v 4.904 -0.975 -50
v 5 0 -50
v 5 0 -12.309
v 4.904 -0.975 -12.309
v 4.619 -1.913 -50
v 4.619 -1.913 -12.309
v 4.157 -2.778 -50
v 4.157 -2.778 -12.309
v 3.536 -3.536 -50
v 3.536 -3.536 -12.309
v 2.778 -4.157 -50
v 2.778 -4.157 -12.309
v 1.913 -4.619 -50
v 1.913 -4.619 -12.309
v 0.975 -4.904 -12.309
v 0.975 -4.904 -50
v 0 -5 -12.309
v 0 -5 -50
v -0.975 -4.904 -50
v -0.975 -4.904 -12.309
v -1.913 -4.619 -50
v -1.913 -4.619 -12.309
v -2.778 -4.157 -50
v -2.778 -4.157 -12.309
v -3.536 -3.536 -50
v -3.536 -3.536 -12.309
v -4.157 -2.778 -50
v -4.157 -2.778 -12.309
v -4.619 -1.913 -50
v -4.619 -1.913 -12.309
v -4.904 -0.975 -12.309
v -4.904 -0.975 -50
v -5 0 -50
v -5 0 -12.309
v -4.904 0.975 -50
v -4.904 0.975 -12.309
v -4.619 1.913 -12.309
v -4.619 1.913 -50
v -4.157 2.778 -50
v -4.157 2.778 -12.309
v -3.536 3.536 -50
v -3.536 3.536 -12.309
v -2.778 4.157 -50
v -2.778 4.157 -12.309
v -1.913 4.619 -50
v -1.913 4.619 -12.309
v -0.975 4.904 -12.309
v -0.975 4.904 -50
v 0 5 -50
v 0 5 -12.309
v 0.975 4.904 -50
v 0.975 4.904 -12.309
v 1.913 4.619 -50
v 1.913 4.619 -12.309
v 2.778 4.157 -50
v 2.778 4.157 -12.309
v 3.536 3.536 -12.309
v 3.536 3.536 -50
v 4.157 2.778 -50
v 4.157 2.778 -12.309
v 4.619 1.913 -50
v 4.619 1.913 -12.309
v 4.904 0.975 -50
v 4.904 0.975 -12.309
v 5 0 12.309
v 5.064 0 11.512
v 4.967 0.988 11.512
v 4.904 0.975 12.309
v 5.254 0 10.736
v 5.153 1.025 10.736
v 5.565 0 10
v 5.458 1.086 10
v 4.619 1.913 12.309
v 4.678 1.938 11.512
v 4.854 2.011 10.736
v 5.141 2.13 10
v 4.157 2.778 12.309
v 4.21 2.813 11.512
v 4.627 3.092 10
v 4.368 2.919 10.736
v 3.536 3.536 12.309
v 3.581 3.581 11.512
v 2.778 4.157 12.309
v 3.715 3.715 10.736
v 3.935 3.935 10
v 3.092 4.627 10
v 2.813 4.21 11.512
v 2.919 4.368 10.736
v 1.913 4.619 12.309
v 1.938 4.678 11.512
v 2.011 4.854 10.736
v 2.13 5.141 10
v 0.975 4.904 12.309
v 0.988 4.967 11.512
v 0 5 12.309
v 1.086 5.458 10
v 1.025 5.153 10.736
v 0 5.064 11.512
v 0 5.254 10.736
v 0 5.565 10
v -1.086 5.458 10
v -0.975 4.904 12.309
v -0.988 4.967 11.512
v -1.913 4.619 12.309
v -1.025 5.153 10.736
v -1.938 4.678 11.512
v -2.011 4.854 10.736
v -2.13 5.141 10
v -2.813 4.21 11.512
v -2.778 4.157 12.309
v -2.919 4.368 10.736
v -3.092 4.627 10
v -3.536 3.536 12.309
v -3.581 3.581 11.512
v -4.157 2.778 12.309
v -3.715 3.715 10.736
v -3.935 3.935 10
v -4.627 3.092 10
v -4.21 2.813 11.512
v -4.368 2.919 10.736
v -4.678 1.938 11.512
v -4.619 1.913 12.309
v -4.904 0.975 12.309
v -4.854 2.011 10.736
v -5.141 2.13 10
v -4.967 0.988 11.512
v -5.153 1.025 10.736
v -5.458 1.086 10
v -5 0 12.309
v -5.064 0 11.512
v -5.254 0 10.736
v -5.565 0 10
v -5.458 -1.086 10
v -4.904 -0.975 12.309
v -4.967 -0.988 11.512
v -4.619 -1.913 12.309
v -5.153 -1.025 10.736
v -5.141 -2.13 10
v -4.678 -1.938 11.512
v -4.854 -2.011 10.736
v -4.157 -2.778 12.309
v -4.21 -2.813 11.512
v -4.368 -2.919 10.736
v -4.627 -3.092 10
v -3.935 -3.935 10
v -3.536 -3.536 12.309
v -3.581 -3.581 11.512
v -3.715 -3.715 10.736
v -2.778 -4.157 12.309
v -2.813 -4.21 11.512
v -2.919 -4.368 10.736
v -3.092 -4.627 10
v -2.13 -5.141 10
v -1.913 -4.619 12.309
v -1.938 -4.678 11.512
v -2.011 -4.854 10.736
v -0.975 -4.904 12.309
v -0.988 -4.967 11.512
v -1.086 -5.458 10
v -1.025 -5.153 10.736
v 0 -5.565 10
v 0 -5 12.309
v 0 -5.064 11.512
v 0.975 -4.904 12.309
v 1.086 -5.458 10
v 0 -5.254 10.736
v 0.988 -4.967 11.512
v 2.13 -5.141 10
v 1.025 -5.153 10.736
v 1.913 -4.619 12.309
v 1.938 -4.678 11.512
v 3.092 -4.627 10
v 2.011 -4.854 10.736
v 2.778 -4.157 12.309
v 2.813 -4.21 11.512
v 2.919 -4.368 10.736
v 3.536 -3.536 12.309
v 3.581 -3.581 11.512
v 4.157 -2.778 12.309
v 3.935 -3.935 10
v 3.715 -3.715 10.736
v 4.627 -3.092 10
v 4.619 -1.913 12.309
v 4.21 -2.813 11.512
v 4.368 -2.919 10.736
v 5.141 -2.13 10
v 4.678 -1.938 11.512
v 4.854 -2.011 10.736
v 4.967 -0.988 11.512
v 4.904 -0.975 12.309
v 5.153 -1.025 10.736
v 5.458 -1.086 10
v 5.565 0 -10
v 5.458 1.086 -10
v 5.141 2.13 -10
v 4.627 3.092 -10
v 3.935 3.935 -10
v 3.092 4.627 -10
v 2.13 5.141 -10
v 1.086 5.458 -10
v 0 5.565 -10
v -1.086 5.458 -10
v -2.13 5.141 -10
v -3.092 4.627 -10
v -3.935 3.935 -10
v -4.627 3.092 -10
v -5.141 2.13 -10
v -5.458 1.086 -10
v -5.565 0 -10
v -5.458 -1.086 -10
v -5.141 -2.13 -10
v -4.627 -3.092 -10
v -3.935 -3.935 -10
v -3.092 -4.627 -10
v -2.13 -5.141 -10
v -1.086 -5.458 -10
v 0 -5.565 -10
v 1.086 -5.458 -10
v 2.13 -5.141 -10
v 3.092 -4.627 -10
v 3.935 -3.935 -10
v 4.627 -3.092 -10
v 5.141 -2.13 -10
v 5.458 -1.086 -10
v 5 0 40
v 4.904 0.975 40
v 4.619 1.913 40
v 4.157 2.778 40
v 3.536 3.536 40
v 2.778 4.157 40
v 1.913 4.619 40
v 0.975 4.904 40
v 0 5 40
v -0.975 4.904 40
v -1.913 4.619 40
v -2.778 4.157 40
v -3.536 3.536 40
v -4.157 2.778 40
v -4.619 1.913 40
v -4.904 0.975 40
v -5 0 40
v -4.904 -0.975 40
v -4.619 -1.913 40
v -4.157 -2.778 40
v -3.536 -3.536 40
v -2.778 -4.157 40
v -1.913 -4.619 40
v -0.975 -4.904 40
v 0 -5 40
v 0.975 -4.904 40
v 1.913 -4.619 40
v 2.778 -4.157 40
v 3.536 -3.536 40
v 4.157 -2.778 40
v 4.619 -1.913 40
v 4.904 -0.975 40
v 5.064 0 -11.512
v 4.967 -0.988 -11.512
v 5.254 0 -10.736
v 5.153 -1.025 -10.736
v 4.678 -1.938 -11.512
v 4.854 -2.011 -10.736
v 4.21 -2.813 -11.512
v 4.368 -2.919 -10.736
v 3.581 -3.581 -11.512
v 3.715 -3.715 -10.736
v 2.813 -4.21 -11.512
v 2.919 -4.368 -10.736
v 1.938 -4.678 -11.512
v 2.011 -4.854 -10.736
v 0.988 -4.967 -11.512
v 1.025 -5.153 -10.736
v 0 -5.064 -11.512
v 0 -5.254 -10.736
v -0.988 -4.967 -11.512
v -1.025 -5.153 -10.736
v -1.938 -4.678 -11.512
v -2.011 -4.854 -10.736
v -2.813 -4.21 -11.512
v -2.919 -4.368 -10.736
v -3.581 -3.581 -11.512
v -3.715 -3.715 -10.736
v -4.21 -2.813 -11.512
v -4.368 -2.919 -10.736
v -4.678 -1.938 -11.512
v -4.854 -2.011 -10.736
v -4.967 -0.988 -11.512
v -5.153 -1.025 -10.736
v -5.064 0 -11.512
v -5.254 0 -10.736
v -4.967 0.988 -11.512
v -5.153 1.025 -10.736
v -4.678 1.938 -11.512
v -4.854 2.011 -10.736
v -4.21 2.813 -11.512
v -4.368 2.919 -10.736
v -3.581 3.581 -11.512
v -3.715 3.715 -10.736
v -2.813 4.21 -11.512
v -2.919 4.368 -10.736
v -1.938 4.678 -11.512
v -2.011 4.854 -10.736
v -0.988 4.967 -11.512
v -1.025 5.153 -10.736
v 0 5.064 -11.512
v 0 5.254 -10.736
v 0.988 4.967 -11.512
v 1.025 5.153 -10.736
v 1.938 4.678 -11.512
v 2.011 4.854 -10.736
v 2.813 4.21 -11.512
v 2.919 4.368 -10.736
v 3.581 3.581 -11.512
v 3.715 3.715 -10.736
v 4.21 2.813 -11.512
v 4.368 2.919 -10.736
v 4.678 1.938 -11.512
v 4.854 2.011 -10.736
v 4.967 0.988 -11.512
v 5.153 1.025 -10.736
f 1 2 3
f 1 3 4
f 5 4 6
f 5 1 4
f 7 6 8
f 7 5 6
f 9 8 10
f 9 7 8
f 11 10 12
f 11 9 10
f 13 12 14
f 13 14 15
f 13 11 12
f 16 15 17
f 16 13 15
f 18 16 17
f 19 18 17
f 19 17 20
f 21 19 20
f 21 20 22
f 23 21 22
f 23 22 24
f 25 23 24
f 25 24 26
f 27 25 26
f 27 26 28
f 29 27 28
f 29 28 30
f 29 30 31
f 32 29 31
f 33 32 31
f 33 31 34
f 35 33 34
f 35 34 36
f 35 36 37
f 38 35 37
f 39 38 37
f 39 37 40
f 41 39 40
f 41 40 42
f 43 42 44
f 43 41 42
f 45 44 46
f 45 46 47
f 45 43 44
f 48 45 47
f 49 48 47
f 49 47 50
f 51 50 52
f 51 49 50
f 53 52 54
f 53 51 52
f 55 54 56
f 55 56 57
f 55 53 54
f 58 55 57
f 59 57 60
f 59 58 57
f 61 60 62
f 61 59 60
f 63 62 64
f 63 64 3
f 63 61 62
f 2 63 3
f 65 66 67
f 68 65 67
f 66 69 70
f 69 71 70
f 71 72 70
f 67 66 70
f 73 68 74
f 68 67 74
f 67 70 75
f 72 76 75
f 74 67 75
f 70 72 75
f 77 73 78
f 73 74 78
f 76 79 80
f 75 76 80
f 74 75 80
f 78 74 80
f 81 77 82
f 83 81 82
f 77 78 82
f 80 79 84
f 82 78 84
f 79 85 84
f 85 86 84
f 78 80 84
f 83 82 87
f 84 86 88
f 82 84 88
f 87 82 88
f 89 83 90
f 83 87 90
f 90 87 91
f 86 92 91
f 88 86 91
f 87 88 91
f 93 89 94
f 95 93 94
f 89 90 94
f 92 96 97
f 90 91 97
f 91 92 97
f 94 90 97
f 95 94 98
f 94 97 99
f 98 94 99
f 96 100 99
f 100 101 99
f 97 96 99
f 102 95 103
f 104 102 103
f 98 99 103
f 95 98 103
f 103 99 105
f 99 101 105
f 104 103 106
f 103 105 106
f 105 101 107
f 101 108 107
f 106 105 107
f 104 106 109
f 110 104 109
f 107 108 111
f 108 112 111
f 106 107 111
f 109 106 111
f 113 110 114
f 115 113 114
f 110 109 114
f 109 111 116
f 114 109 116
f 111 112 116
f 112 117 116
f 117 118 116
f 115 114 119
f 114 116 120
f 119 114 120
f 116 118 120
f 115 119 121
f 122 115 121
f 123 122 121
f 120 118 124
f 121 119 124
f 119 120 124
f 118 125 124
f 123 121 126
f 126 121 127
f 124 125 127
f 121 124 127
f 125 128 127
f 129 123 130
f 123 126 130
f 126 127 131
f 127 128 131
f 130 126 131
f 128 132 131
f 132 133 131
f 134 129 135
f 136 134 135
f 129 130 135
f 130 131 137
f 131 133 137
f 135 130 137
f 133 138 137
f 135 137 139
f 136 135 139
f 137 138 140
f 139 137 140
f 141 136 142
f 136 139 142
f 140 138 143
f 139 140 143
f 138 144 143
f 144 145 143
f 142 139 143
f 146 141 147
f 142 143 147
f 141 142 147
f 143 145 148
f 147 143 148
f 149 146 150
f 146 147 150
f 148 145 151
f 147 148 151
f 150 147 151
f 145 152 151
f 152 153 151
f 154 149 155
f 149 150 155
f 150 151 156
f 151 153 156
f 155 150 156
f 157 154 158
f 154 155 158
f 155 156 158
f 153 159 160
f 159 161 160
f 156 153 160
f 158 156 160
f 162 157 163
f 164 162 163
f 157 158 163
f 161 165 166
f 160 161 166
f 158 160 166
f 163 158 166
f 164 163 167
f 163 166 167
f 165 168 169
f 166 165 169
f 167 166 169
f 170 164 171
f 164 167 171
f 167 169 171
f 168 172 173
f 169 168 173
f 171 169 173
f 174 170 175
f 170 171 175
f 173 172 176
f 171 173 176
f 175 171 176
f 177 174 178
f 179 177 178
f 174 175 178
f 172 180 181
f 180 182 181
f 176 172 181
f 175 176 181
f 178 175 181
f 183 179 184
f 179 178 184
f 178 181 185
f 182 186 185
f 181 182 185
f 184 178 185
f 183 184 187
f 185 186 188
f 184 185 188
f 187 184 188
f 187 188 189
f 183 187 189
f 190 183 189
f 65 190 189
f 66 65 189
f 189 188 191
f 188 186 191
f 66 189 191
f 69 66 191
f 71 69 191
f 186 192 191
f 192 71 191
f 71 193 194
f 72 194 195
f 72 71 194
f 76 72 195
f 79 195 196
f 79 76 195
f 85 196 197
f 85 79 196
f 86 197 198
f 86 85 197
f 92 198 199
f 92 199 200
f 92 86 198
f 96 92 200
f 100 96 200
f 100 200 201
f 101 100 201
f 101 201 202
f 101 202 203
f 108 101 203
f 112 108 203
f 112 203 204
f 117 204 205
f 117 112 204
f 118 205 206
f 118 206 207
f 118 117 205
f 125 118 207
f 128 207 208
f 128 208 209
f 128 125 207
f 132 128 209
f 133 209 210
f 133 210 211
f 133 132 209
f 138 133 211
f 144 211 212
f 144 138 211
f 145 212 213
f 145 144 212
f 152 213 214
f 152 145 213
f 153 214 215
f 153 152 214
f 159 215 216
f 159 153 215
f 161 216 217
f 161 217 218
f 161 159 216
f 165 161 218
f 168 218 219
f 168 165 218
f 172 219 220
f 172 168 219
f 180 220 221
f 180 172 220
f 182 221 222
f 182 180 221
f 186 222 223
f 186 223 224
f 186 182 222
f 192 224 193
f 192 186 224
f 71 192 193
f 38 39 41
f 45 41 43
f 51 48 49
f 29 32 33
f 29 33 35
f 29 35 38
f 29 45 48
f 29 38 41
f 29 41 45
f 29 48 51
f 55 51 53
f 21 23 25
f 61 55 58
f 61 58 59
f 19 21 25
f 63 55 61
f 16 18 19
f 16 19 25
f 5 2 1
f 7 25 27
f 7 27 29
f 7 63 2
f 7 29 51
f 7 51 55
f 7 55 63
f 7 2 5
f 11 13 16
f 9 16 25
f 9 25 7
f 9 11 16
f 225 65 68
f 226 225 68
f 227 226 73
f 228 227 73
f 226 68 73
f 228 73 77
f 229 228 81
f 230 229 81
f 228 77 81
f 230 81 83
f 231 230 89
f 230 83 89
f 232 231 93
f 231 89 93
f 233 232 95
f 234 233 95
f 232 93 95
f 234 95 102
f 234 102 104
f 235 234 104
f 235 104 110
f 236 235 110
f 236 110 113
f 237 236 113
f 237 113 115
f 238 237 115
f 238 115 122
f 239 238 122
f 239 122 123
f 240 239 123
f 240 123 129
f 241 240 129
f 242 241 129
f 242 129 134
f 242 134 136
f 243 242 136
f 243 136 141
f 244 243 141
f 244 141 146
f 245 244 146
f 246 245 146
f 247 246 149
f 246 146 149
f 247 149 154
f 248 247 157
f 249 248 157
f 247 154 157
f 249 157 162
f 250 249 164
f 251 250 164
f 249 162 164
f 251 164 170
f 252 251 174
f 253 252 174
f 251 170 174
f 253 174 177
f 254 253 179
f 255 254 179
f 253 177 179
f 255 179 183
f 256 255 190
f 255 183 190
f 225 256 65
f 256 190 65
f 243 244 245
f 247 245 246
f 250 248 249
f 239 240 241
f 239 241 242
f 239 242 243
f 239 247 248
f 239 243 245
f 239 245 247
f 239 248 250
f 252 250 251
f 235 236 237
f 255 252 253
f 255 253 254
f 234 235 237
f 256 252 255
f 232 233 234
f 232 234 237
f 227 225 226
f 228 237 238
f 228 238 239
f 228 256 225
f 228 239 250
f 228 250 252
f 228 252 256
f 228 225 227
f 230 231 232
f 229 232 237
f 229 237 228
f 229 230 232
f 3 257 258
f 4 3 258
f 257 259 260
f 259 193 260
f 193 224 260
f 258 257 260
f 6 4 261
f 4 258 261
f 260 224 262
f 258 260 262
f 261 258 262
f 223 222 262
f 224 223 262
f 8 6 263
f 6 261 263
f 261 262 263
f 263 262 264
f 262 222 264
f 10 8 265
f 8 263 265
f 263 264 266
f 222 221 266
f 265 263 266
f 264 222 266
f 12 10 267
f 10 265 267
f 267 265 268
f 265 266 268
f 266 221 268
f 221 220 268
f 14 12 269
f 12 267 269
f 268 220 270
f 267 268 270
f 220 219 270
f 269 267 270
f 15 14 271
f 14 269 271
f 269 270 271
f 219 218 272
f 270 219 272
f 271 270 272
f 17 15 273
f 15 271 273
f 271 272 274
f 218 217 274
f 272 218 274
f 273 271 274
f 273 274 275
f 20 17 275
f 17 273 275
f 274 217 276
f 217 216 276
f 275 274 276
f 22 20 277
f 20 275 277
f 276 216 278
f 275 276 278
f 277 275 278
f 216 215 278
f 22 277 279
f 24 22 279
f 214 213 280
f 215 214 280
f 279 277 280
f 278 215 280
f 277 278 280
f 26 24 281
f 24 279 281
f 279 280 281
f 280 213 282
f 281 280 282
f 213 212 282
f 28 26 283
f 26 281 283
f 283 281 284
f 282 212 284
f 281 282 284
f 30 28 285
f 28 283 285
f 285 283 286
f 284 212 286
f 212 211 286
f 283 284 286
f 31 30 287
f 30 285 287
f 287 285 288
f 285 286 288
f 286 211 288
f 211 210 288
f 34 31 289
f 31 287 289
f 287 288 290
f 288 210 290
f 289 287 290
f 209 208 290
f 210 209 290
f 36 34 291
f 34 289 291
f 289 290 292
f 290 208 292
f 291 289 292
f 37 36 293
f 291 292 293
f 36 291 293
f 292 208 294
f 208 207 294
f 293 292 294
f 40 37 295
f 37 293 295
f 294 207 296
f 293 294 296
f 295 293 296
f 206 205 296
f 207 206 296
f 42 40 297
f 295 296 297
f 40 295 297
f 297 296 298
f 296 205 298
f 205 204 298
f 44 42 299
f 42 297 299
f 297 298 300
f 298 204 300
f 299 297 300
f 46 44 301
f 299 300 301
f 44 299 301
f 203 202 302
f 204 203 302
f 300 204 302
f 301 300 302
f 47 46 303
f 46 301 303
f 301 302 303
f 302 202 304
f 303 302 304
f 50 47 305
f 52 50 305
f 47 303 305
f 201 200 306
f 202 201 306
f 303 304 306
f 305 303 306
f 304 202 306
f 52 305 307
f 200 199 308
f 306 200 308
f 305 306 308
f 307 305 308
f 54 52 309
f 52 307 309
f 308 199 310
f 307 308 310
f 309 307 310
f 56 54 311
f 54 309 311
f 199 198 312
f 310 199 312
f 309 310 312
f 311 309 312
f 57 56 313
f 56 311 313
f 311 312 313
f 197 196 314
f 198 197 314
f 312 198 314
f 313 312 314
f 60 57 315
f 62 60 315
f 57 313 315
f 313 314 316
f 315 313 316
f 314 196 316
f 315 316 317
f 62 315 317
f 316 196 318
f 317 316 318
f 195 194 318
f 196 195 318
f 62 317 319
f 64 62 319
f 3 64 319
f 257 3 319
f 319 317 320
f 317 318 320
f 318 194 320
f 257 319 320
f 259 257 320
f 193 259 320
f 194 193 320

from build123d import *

# Parameters (mm, degrees)
SKETCH1_R           = 5.565
BOSS_EXTRUDE1_DEPTH = 10
SKETCH2_R           = 5
BOSS_EXTRUDE2_DEPTH = 30
BOSS_EXTRUDE3_START = 40
SKETCH3_R           = 5
BOSS_EXTRUDE3_DEPTH = 40
FILLET2_R           = 5


with BuildPart() as part:
    # Sketch1 → Boss-Extrude1 (new, symmetric)
    with BuildSketch(Plane.XY):
        Circle(SKETCH1_R)
    extrude(amount=BOSS_EXTRUDE1_DEPTH, both=True)

    # Sketch2 → Boss-Extrude2 (add)
    with BuildSketch(Plane.XY.offset(10)):
        Circle(SKETCH2_R)
    extrude(amount=BOSS_EXTRUDE2_DEPTH)

    # Sketch3 → Boss-Extrude3 (add)
    with BuildSketch(Plane(origin=(0, 0, -10), x_dir=(-1, 0, 0), z_dir=(0, 0, -1)).offset(BOSS_EXTRUDE3_START)):
        with Locations(Location((0, 0, 0), (0, 0, 180))):
            Circle(SKETCH3_R)
    extrude(amount=-BOSS_EXTRUDE3_DEPTH)

    # Fillet2
    # the kernel refuses this fillet: 5 mm, written as the material it adds along each edge
    with BuildSketch(Plane(origin=(0, 0, 10), x_dir=(1, 0, 0), z_dir=(0, -1, 0))) as fillet2_piece_1:
        with BuildLine():
            CenterArc((10, 2.308847115), FILLET2_R, 180, 27.501344198)
            Line((5, 2.308847115), (4.9, 2.308847115))
            Line((4.9, 2.308847115), (4.9, 0))
            Line((4.9, 0), (5, -0.1))
            ThreePointArc((5, -0.1), (5.2825, -0.1), (5.4763, -0.046176942))
            Line((5.4763, -0.046176942), (5.565, 0))
        make_face()
    revolve(axis=Axis((0, 0, 10), (0, 0, 1)))
    with BuildSketch(Plane(origin=(0, 0, -10), x_dir=(1, 0, 0), z_dir=(0, 1, 0))) as fillet2_piece_2:
        with BuildLine():
            CenterArc((10, 2.308847115), FILLET2_R, 180, 27.501344198)
            Line((5, 2.308847115), (4.9, 2.308847115))
            Line((4.9, 2.308847115), (4.9, 0))
            Line((4.9, 0), (5, -0.1))
            ThreePointArc((5, -0.1), (5.2825, -0.1), (5.4763, -0.046176942))
            Line((5.4763, -0.046176942), (5.565, 0))
        make_face()
    revolve(axis=Axis((0, 0, -10), (0, 0, -1)))


solid = part.part
